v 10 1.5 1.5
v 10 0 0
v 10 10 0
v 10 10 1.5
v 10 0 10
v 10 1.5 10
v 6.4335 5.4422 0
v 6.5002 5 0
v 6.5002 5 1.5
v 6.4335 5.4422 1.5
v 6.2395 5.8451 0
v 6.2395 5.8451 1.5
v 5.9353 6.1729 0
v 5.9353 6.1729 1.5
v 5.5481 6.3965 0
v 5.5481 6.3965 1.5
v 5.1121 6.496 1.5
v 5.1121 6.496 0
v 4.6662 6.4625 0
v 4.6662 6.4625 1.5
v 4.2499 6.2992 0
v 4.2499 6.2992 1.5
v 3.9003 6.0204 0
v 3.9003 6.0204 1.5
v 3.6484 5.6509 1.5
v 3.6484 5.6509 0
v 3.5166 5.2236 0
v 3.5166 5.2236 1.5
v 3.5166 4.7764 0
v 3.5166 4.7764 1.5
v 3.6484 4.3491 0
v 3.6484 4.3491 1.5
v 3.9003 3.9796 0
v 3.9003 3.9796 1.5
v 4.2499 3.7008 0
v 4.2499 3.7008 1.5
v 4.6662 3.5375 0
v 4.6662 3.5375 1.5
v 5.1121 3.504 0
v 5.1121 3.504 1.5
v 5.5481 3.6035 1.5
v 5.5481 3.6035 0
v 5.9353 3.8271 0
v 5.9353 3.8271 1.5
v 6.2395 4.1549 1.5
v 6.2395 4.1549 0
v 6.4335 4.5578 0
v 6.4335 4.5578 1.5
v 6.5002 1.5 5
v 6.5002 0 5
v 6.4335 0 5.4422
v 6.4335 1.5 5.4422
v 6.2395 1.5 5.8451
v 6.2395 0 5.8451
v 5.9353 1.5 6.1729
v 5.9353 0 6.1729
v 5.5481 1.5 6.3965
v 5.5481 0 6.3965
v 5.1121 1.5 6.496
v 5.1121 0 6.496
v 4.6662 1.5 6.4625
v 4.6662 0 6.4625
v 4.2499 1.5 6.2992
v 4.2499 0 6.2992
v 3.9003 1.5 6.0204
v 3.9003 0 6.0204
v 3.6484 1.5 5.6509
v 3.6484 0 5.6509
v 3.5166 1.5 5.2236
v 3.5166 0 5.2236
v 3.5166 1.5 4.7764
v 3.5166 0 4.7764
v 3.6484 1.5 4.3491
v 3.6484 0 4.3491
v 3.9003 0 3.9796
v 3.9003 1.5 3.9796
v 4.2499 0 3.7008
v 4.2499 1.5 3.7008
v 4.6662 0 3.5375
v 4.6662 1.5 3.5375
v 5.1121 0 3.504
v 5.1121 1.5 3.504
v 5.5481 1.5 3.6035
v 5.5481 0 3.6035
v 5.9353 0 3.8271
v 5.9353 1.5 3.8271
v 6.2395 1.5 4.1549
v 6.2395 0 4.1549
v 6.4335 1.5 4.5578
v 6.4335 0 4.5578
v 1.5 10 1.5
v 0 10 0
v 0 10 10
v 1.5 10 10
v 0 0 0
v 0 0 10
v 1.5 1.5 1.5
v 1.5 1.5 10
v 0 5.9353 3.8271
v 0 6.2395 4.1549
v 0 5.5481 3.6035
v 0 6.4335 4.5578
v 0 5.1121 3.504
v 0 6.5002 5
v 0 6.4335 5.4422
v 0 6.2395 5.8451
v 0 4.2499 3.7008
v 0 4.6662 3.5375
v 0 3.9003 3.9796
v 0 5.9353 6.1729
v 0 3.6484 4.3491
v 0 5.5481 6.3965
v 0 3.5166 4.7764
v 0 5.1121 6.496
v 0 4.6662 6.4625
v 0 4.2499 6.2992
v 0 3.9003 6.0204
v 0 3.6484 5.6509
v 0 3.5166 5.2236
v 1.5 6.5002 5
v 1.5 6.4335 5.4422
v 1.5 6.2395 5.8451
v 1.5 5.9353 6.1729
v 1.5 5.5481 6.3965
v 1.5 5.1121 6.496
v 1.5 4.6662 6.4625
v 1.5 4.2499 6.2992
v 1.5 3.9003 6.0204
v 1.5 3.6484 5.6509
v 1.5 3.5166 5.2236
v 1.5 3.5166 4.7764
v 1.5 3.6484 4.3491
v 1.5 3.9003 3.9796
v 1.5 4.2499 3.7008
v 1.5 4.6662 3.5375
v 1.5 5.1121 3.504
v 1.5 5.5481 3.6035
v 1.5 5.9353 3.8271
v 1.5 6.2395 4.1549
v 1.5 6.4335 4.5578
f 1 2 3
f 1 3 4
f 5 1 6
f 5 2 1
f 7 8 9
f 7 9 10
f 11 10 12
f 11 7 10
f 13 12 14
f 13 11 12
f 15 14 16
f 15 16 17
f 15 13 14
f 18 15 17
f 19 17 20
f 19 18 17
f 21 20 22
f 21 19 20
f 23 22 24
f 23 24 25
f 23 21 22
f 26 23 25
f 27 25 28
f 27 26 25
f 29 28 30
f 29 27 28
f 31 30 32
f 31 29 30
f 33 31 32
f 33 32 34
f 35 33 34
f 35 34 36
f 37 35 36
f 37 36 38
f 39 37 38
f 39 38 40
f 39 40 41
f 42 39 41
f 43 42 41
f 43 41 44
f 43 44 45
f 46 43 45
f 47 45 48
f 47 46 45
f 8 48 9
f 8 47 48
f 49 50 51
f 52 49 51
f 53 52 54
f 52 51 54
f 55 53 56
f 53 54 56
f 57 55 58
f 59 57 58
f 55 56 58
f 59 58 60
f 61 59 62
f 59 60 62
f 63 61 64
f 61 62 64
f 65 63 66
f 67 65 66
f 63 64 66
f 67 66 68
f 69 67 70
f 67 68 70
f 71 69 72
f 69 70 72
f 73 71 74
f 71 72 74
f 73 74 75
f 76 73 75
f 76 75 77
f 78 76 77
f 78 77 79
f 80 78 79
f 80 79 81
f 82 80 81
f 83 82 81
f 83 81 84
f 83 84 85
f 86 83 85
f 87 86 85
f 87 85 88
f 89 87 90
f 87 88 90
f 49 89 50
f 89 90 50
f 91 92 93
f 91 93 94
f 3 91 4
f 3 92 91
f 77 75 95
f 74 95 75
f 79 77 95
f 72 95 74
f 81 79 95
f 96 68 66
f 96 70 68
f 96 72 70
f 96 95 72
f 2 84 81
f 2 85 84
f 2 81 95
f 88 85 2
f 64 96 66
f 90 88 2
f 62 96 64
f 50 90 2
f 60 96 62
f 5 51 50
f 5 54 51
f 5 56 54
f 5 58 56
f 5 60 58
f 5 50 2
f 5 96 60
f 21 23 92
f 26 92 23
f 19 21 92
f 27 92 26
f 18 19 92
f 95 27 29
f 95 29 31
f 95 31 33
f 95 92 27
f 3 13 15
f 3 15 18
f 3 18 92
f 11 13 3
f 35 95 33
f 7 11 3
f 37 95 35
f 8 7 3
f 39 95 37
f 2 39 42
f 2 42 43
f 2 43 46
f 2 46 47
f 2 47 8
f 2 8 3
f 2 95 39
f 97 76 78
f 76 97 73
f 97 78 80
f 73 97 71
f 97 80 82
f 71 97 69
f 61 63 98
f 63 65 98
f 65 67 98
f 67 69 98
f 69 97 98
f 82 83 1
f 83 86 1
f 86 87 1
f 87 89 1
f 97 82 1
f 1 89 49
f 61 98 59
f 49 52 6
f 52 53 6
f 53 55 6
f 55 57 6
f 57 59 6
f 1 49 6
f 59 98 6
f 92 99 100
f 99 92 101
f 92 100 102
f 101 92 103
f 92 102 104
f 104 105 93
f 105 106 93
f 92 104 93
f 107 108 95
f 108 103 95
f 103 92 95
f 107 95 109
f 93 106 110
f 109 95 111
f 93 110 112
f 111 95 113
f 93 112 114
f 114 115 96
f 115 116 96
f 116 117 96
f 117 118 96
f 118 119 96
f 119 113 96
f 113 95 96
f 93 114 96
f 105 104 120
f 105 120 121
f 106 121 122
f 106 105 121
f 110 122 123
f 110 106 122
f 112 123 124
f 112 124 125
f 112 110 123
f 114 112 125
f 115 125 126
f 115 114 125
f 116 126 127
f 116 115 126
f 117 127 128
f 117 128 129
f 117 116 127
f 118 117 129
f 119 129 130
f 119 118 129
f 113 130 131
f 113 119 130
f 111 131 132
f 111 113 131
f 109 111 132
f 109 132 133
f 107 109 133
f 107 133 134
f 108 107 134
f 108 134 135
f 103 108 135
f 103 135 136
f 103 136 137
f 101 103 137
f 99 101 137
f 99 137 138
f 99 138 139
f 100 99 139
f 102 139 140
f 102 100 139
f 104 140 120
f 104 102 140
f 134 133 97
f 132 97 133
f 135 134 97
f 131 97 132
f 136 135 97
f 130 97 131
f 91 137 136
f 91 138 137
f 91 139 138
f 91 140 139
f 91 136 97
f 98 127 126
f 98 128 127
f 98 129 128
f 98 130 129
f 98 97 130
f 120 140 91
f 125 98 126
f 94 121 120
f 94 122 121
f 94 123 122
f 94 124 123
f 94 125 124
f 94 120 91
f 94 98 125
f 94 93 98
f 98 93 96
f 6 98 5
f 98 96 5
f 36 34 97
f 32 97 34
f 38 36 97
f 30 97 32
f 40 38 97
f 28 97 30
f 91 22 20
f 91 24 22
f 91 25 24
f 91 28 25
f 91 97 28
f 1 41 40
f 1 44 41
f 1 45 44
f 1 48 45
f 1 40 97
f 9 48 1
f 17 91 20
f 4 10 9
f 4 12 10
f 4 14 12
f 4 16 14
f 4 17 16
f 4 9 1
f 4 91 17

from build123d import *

# Parameters (mm, degrees)
F0_W     = 10
F0_H     = 10
F0_R     = 1.500154
F3_DEPTH = 1.5
F2_W     = 10
F2_H     = 10
F2_R     = 1.500154
F4_DEPTH = 1.5
F1_W     = 10
F1_H     = 10
F1_R     = 1.500154
F5_DEPTH = 1.5


with BuildPart() as f3:
    # F0 (on Front) → F3 (new body)
    with BuildSketch(Plane.XZ):
        with Locations((5, 5)):
            Rectangle(F0_W, F0_H)
        with Locations((5, 5)):
            Circle(F0_R, mode=Mode.SUBTRACT)
    extrude(amount=-F3_DEPTH)

    # F2 (on Top) → F4 (join)
    with BuildSketch(Plane.XY):
        with Locations((5, 5)):
            Rectangle(F2_W, F2_H)
        with Locations((5, 5)):
            Circle(F2_R, mode=Mode.SUBTRACT)
    extrude(amount=F4_DEPTH)

    # F1 (on Right) → F5 (join)
    with BuildSketch(Plane.YZ):
        with Locations((5, 5)):
            Rectangle(F1_W, F1_H)
        with Locations((5, 5)):
            Circle(F1_R, mode=Mode.SUBTRACT)
    extrude(amount=F5_DEPTH)


solid = f3.part
